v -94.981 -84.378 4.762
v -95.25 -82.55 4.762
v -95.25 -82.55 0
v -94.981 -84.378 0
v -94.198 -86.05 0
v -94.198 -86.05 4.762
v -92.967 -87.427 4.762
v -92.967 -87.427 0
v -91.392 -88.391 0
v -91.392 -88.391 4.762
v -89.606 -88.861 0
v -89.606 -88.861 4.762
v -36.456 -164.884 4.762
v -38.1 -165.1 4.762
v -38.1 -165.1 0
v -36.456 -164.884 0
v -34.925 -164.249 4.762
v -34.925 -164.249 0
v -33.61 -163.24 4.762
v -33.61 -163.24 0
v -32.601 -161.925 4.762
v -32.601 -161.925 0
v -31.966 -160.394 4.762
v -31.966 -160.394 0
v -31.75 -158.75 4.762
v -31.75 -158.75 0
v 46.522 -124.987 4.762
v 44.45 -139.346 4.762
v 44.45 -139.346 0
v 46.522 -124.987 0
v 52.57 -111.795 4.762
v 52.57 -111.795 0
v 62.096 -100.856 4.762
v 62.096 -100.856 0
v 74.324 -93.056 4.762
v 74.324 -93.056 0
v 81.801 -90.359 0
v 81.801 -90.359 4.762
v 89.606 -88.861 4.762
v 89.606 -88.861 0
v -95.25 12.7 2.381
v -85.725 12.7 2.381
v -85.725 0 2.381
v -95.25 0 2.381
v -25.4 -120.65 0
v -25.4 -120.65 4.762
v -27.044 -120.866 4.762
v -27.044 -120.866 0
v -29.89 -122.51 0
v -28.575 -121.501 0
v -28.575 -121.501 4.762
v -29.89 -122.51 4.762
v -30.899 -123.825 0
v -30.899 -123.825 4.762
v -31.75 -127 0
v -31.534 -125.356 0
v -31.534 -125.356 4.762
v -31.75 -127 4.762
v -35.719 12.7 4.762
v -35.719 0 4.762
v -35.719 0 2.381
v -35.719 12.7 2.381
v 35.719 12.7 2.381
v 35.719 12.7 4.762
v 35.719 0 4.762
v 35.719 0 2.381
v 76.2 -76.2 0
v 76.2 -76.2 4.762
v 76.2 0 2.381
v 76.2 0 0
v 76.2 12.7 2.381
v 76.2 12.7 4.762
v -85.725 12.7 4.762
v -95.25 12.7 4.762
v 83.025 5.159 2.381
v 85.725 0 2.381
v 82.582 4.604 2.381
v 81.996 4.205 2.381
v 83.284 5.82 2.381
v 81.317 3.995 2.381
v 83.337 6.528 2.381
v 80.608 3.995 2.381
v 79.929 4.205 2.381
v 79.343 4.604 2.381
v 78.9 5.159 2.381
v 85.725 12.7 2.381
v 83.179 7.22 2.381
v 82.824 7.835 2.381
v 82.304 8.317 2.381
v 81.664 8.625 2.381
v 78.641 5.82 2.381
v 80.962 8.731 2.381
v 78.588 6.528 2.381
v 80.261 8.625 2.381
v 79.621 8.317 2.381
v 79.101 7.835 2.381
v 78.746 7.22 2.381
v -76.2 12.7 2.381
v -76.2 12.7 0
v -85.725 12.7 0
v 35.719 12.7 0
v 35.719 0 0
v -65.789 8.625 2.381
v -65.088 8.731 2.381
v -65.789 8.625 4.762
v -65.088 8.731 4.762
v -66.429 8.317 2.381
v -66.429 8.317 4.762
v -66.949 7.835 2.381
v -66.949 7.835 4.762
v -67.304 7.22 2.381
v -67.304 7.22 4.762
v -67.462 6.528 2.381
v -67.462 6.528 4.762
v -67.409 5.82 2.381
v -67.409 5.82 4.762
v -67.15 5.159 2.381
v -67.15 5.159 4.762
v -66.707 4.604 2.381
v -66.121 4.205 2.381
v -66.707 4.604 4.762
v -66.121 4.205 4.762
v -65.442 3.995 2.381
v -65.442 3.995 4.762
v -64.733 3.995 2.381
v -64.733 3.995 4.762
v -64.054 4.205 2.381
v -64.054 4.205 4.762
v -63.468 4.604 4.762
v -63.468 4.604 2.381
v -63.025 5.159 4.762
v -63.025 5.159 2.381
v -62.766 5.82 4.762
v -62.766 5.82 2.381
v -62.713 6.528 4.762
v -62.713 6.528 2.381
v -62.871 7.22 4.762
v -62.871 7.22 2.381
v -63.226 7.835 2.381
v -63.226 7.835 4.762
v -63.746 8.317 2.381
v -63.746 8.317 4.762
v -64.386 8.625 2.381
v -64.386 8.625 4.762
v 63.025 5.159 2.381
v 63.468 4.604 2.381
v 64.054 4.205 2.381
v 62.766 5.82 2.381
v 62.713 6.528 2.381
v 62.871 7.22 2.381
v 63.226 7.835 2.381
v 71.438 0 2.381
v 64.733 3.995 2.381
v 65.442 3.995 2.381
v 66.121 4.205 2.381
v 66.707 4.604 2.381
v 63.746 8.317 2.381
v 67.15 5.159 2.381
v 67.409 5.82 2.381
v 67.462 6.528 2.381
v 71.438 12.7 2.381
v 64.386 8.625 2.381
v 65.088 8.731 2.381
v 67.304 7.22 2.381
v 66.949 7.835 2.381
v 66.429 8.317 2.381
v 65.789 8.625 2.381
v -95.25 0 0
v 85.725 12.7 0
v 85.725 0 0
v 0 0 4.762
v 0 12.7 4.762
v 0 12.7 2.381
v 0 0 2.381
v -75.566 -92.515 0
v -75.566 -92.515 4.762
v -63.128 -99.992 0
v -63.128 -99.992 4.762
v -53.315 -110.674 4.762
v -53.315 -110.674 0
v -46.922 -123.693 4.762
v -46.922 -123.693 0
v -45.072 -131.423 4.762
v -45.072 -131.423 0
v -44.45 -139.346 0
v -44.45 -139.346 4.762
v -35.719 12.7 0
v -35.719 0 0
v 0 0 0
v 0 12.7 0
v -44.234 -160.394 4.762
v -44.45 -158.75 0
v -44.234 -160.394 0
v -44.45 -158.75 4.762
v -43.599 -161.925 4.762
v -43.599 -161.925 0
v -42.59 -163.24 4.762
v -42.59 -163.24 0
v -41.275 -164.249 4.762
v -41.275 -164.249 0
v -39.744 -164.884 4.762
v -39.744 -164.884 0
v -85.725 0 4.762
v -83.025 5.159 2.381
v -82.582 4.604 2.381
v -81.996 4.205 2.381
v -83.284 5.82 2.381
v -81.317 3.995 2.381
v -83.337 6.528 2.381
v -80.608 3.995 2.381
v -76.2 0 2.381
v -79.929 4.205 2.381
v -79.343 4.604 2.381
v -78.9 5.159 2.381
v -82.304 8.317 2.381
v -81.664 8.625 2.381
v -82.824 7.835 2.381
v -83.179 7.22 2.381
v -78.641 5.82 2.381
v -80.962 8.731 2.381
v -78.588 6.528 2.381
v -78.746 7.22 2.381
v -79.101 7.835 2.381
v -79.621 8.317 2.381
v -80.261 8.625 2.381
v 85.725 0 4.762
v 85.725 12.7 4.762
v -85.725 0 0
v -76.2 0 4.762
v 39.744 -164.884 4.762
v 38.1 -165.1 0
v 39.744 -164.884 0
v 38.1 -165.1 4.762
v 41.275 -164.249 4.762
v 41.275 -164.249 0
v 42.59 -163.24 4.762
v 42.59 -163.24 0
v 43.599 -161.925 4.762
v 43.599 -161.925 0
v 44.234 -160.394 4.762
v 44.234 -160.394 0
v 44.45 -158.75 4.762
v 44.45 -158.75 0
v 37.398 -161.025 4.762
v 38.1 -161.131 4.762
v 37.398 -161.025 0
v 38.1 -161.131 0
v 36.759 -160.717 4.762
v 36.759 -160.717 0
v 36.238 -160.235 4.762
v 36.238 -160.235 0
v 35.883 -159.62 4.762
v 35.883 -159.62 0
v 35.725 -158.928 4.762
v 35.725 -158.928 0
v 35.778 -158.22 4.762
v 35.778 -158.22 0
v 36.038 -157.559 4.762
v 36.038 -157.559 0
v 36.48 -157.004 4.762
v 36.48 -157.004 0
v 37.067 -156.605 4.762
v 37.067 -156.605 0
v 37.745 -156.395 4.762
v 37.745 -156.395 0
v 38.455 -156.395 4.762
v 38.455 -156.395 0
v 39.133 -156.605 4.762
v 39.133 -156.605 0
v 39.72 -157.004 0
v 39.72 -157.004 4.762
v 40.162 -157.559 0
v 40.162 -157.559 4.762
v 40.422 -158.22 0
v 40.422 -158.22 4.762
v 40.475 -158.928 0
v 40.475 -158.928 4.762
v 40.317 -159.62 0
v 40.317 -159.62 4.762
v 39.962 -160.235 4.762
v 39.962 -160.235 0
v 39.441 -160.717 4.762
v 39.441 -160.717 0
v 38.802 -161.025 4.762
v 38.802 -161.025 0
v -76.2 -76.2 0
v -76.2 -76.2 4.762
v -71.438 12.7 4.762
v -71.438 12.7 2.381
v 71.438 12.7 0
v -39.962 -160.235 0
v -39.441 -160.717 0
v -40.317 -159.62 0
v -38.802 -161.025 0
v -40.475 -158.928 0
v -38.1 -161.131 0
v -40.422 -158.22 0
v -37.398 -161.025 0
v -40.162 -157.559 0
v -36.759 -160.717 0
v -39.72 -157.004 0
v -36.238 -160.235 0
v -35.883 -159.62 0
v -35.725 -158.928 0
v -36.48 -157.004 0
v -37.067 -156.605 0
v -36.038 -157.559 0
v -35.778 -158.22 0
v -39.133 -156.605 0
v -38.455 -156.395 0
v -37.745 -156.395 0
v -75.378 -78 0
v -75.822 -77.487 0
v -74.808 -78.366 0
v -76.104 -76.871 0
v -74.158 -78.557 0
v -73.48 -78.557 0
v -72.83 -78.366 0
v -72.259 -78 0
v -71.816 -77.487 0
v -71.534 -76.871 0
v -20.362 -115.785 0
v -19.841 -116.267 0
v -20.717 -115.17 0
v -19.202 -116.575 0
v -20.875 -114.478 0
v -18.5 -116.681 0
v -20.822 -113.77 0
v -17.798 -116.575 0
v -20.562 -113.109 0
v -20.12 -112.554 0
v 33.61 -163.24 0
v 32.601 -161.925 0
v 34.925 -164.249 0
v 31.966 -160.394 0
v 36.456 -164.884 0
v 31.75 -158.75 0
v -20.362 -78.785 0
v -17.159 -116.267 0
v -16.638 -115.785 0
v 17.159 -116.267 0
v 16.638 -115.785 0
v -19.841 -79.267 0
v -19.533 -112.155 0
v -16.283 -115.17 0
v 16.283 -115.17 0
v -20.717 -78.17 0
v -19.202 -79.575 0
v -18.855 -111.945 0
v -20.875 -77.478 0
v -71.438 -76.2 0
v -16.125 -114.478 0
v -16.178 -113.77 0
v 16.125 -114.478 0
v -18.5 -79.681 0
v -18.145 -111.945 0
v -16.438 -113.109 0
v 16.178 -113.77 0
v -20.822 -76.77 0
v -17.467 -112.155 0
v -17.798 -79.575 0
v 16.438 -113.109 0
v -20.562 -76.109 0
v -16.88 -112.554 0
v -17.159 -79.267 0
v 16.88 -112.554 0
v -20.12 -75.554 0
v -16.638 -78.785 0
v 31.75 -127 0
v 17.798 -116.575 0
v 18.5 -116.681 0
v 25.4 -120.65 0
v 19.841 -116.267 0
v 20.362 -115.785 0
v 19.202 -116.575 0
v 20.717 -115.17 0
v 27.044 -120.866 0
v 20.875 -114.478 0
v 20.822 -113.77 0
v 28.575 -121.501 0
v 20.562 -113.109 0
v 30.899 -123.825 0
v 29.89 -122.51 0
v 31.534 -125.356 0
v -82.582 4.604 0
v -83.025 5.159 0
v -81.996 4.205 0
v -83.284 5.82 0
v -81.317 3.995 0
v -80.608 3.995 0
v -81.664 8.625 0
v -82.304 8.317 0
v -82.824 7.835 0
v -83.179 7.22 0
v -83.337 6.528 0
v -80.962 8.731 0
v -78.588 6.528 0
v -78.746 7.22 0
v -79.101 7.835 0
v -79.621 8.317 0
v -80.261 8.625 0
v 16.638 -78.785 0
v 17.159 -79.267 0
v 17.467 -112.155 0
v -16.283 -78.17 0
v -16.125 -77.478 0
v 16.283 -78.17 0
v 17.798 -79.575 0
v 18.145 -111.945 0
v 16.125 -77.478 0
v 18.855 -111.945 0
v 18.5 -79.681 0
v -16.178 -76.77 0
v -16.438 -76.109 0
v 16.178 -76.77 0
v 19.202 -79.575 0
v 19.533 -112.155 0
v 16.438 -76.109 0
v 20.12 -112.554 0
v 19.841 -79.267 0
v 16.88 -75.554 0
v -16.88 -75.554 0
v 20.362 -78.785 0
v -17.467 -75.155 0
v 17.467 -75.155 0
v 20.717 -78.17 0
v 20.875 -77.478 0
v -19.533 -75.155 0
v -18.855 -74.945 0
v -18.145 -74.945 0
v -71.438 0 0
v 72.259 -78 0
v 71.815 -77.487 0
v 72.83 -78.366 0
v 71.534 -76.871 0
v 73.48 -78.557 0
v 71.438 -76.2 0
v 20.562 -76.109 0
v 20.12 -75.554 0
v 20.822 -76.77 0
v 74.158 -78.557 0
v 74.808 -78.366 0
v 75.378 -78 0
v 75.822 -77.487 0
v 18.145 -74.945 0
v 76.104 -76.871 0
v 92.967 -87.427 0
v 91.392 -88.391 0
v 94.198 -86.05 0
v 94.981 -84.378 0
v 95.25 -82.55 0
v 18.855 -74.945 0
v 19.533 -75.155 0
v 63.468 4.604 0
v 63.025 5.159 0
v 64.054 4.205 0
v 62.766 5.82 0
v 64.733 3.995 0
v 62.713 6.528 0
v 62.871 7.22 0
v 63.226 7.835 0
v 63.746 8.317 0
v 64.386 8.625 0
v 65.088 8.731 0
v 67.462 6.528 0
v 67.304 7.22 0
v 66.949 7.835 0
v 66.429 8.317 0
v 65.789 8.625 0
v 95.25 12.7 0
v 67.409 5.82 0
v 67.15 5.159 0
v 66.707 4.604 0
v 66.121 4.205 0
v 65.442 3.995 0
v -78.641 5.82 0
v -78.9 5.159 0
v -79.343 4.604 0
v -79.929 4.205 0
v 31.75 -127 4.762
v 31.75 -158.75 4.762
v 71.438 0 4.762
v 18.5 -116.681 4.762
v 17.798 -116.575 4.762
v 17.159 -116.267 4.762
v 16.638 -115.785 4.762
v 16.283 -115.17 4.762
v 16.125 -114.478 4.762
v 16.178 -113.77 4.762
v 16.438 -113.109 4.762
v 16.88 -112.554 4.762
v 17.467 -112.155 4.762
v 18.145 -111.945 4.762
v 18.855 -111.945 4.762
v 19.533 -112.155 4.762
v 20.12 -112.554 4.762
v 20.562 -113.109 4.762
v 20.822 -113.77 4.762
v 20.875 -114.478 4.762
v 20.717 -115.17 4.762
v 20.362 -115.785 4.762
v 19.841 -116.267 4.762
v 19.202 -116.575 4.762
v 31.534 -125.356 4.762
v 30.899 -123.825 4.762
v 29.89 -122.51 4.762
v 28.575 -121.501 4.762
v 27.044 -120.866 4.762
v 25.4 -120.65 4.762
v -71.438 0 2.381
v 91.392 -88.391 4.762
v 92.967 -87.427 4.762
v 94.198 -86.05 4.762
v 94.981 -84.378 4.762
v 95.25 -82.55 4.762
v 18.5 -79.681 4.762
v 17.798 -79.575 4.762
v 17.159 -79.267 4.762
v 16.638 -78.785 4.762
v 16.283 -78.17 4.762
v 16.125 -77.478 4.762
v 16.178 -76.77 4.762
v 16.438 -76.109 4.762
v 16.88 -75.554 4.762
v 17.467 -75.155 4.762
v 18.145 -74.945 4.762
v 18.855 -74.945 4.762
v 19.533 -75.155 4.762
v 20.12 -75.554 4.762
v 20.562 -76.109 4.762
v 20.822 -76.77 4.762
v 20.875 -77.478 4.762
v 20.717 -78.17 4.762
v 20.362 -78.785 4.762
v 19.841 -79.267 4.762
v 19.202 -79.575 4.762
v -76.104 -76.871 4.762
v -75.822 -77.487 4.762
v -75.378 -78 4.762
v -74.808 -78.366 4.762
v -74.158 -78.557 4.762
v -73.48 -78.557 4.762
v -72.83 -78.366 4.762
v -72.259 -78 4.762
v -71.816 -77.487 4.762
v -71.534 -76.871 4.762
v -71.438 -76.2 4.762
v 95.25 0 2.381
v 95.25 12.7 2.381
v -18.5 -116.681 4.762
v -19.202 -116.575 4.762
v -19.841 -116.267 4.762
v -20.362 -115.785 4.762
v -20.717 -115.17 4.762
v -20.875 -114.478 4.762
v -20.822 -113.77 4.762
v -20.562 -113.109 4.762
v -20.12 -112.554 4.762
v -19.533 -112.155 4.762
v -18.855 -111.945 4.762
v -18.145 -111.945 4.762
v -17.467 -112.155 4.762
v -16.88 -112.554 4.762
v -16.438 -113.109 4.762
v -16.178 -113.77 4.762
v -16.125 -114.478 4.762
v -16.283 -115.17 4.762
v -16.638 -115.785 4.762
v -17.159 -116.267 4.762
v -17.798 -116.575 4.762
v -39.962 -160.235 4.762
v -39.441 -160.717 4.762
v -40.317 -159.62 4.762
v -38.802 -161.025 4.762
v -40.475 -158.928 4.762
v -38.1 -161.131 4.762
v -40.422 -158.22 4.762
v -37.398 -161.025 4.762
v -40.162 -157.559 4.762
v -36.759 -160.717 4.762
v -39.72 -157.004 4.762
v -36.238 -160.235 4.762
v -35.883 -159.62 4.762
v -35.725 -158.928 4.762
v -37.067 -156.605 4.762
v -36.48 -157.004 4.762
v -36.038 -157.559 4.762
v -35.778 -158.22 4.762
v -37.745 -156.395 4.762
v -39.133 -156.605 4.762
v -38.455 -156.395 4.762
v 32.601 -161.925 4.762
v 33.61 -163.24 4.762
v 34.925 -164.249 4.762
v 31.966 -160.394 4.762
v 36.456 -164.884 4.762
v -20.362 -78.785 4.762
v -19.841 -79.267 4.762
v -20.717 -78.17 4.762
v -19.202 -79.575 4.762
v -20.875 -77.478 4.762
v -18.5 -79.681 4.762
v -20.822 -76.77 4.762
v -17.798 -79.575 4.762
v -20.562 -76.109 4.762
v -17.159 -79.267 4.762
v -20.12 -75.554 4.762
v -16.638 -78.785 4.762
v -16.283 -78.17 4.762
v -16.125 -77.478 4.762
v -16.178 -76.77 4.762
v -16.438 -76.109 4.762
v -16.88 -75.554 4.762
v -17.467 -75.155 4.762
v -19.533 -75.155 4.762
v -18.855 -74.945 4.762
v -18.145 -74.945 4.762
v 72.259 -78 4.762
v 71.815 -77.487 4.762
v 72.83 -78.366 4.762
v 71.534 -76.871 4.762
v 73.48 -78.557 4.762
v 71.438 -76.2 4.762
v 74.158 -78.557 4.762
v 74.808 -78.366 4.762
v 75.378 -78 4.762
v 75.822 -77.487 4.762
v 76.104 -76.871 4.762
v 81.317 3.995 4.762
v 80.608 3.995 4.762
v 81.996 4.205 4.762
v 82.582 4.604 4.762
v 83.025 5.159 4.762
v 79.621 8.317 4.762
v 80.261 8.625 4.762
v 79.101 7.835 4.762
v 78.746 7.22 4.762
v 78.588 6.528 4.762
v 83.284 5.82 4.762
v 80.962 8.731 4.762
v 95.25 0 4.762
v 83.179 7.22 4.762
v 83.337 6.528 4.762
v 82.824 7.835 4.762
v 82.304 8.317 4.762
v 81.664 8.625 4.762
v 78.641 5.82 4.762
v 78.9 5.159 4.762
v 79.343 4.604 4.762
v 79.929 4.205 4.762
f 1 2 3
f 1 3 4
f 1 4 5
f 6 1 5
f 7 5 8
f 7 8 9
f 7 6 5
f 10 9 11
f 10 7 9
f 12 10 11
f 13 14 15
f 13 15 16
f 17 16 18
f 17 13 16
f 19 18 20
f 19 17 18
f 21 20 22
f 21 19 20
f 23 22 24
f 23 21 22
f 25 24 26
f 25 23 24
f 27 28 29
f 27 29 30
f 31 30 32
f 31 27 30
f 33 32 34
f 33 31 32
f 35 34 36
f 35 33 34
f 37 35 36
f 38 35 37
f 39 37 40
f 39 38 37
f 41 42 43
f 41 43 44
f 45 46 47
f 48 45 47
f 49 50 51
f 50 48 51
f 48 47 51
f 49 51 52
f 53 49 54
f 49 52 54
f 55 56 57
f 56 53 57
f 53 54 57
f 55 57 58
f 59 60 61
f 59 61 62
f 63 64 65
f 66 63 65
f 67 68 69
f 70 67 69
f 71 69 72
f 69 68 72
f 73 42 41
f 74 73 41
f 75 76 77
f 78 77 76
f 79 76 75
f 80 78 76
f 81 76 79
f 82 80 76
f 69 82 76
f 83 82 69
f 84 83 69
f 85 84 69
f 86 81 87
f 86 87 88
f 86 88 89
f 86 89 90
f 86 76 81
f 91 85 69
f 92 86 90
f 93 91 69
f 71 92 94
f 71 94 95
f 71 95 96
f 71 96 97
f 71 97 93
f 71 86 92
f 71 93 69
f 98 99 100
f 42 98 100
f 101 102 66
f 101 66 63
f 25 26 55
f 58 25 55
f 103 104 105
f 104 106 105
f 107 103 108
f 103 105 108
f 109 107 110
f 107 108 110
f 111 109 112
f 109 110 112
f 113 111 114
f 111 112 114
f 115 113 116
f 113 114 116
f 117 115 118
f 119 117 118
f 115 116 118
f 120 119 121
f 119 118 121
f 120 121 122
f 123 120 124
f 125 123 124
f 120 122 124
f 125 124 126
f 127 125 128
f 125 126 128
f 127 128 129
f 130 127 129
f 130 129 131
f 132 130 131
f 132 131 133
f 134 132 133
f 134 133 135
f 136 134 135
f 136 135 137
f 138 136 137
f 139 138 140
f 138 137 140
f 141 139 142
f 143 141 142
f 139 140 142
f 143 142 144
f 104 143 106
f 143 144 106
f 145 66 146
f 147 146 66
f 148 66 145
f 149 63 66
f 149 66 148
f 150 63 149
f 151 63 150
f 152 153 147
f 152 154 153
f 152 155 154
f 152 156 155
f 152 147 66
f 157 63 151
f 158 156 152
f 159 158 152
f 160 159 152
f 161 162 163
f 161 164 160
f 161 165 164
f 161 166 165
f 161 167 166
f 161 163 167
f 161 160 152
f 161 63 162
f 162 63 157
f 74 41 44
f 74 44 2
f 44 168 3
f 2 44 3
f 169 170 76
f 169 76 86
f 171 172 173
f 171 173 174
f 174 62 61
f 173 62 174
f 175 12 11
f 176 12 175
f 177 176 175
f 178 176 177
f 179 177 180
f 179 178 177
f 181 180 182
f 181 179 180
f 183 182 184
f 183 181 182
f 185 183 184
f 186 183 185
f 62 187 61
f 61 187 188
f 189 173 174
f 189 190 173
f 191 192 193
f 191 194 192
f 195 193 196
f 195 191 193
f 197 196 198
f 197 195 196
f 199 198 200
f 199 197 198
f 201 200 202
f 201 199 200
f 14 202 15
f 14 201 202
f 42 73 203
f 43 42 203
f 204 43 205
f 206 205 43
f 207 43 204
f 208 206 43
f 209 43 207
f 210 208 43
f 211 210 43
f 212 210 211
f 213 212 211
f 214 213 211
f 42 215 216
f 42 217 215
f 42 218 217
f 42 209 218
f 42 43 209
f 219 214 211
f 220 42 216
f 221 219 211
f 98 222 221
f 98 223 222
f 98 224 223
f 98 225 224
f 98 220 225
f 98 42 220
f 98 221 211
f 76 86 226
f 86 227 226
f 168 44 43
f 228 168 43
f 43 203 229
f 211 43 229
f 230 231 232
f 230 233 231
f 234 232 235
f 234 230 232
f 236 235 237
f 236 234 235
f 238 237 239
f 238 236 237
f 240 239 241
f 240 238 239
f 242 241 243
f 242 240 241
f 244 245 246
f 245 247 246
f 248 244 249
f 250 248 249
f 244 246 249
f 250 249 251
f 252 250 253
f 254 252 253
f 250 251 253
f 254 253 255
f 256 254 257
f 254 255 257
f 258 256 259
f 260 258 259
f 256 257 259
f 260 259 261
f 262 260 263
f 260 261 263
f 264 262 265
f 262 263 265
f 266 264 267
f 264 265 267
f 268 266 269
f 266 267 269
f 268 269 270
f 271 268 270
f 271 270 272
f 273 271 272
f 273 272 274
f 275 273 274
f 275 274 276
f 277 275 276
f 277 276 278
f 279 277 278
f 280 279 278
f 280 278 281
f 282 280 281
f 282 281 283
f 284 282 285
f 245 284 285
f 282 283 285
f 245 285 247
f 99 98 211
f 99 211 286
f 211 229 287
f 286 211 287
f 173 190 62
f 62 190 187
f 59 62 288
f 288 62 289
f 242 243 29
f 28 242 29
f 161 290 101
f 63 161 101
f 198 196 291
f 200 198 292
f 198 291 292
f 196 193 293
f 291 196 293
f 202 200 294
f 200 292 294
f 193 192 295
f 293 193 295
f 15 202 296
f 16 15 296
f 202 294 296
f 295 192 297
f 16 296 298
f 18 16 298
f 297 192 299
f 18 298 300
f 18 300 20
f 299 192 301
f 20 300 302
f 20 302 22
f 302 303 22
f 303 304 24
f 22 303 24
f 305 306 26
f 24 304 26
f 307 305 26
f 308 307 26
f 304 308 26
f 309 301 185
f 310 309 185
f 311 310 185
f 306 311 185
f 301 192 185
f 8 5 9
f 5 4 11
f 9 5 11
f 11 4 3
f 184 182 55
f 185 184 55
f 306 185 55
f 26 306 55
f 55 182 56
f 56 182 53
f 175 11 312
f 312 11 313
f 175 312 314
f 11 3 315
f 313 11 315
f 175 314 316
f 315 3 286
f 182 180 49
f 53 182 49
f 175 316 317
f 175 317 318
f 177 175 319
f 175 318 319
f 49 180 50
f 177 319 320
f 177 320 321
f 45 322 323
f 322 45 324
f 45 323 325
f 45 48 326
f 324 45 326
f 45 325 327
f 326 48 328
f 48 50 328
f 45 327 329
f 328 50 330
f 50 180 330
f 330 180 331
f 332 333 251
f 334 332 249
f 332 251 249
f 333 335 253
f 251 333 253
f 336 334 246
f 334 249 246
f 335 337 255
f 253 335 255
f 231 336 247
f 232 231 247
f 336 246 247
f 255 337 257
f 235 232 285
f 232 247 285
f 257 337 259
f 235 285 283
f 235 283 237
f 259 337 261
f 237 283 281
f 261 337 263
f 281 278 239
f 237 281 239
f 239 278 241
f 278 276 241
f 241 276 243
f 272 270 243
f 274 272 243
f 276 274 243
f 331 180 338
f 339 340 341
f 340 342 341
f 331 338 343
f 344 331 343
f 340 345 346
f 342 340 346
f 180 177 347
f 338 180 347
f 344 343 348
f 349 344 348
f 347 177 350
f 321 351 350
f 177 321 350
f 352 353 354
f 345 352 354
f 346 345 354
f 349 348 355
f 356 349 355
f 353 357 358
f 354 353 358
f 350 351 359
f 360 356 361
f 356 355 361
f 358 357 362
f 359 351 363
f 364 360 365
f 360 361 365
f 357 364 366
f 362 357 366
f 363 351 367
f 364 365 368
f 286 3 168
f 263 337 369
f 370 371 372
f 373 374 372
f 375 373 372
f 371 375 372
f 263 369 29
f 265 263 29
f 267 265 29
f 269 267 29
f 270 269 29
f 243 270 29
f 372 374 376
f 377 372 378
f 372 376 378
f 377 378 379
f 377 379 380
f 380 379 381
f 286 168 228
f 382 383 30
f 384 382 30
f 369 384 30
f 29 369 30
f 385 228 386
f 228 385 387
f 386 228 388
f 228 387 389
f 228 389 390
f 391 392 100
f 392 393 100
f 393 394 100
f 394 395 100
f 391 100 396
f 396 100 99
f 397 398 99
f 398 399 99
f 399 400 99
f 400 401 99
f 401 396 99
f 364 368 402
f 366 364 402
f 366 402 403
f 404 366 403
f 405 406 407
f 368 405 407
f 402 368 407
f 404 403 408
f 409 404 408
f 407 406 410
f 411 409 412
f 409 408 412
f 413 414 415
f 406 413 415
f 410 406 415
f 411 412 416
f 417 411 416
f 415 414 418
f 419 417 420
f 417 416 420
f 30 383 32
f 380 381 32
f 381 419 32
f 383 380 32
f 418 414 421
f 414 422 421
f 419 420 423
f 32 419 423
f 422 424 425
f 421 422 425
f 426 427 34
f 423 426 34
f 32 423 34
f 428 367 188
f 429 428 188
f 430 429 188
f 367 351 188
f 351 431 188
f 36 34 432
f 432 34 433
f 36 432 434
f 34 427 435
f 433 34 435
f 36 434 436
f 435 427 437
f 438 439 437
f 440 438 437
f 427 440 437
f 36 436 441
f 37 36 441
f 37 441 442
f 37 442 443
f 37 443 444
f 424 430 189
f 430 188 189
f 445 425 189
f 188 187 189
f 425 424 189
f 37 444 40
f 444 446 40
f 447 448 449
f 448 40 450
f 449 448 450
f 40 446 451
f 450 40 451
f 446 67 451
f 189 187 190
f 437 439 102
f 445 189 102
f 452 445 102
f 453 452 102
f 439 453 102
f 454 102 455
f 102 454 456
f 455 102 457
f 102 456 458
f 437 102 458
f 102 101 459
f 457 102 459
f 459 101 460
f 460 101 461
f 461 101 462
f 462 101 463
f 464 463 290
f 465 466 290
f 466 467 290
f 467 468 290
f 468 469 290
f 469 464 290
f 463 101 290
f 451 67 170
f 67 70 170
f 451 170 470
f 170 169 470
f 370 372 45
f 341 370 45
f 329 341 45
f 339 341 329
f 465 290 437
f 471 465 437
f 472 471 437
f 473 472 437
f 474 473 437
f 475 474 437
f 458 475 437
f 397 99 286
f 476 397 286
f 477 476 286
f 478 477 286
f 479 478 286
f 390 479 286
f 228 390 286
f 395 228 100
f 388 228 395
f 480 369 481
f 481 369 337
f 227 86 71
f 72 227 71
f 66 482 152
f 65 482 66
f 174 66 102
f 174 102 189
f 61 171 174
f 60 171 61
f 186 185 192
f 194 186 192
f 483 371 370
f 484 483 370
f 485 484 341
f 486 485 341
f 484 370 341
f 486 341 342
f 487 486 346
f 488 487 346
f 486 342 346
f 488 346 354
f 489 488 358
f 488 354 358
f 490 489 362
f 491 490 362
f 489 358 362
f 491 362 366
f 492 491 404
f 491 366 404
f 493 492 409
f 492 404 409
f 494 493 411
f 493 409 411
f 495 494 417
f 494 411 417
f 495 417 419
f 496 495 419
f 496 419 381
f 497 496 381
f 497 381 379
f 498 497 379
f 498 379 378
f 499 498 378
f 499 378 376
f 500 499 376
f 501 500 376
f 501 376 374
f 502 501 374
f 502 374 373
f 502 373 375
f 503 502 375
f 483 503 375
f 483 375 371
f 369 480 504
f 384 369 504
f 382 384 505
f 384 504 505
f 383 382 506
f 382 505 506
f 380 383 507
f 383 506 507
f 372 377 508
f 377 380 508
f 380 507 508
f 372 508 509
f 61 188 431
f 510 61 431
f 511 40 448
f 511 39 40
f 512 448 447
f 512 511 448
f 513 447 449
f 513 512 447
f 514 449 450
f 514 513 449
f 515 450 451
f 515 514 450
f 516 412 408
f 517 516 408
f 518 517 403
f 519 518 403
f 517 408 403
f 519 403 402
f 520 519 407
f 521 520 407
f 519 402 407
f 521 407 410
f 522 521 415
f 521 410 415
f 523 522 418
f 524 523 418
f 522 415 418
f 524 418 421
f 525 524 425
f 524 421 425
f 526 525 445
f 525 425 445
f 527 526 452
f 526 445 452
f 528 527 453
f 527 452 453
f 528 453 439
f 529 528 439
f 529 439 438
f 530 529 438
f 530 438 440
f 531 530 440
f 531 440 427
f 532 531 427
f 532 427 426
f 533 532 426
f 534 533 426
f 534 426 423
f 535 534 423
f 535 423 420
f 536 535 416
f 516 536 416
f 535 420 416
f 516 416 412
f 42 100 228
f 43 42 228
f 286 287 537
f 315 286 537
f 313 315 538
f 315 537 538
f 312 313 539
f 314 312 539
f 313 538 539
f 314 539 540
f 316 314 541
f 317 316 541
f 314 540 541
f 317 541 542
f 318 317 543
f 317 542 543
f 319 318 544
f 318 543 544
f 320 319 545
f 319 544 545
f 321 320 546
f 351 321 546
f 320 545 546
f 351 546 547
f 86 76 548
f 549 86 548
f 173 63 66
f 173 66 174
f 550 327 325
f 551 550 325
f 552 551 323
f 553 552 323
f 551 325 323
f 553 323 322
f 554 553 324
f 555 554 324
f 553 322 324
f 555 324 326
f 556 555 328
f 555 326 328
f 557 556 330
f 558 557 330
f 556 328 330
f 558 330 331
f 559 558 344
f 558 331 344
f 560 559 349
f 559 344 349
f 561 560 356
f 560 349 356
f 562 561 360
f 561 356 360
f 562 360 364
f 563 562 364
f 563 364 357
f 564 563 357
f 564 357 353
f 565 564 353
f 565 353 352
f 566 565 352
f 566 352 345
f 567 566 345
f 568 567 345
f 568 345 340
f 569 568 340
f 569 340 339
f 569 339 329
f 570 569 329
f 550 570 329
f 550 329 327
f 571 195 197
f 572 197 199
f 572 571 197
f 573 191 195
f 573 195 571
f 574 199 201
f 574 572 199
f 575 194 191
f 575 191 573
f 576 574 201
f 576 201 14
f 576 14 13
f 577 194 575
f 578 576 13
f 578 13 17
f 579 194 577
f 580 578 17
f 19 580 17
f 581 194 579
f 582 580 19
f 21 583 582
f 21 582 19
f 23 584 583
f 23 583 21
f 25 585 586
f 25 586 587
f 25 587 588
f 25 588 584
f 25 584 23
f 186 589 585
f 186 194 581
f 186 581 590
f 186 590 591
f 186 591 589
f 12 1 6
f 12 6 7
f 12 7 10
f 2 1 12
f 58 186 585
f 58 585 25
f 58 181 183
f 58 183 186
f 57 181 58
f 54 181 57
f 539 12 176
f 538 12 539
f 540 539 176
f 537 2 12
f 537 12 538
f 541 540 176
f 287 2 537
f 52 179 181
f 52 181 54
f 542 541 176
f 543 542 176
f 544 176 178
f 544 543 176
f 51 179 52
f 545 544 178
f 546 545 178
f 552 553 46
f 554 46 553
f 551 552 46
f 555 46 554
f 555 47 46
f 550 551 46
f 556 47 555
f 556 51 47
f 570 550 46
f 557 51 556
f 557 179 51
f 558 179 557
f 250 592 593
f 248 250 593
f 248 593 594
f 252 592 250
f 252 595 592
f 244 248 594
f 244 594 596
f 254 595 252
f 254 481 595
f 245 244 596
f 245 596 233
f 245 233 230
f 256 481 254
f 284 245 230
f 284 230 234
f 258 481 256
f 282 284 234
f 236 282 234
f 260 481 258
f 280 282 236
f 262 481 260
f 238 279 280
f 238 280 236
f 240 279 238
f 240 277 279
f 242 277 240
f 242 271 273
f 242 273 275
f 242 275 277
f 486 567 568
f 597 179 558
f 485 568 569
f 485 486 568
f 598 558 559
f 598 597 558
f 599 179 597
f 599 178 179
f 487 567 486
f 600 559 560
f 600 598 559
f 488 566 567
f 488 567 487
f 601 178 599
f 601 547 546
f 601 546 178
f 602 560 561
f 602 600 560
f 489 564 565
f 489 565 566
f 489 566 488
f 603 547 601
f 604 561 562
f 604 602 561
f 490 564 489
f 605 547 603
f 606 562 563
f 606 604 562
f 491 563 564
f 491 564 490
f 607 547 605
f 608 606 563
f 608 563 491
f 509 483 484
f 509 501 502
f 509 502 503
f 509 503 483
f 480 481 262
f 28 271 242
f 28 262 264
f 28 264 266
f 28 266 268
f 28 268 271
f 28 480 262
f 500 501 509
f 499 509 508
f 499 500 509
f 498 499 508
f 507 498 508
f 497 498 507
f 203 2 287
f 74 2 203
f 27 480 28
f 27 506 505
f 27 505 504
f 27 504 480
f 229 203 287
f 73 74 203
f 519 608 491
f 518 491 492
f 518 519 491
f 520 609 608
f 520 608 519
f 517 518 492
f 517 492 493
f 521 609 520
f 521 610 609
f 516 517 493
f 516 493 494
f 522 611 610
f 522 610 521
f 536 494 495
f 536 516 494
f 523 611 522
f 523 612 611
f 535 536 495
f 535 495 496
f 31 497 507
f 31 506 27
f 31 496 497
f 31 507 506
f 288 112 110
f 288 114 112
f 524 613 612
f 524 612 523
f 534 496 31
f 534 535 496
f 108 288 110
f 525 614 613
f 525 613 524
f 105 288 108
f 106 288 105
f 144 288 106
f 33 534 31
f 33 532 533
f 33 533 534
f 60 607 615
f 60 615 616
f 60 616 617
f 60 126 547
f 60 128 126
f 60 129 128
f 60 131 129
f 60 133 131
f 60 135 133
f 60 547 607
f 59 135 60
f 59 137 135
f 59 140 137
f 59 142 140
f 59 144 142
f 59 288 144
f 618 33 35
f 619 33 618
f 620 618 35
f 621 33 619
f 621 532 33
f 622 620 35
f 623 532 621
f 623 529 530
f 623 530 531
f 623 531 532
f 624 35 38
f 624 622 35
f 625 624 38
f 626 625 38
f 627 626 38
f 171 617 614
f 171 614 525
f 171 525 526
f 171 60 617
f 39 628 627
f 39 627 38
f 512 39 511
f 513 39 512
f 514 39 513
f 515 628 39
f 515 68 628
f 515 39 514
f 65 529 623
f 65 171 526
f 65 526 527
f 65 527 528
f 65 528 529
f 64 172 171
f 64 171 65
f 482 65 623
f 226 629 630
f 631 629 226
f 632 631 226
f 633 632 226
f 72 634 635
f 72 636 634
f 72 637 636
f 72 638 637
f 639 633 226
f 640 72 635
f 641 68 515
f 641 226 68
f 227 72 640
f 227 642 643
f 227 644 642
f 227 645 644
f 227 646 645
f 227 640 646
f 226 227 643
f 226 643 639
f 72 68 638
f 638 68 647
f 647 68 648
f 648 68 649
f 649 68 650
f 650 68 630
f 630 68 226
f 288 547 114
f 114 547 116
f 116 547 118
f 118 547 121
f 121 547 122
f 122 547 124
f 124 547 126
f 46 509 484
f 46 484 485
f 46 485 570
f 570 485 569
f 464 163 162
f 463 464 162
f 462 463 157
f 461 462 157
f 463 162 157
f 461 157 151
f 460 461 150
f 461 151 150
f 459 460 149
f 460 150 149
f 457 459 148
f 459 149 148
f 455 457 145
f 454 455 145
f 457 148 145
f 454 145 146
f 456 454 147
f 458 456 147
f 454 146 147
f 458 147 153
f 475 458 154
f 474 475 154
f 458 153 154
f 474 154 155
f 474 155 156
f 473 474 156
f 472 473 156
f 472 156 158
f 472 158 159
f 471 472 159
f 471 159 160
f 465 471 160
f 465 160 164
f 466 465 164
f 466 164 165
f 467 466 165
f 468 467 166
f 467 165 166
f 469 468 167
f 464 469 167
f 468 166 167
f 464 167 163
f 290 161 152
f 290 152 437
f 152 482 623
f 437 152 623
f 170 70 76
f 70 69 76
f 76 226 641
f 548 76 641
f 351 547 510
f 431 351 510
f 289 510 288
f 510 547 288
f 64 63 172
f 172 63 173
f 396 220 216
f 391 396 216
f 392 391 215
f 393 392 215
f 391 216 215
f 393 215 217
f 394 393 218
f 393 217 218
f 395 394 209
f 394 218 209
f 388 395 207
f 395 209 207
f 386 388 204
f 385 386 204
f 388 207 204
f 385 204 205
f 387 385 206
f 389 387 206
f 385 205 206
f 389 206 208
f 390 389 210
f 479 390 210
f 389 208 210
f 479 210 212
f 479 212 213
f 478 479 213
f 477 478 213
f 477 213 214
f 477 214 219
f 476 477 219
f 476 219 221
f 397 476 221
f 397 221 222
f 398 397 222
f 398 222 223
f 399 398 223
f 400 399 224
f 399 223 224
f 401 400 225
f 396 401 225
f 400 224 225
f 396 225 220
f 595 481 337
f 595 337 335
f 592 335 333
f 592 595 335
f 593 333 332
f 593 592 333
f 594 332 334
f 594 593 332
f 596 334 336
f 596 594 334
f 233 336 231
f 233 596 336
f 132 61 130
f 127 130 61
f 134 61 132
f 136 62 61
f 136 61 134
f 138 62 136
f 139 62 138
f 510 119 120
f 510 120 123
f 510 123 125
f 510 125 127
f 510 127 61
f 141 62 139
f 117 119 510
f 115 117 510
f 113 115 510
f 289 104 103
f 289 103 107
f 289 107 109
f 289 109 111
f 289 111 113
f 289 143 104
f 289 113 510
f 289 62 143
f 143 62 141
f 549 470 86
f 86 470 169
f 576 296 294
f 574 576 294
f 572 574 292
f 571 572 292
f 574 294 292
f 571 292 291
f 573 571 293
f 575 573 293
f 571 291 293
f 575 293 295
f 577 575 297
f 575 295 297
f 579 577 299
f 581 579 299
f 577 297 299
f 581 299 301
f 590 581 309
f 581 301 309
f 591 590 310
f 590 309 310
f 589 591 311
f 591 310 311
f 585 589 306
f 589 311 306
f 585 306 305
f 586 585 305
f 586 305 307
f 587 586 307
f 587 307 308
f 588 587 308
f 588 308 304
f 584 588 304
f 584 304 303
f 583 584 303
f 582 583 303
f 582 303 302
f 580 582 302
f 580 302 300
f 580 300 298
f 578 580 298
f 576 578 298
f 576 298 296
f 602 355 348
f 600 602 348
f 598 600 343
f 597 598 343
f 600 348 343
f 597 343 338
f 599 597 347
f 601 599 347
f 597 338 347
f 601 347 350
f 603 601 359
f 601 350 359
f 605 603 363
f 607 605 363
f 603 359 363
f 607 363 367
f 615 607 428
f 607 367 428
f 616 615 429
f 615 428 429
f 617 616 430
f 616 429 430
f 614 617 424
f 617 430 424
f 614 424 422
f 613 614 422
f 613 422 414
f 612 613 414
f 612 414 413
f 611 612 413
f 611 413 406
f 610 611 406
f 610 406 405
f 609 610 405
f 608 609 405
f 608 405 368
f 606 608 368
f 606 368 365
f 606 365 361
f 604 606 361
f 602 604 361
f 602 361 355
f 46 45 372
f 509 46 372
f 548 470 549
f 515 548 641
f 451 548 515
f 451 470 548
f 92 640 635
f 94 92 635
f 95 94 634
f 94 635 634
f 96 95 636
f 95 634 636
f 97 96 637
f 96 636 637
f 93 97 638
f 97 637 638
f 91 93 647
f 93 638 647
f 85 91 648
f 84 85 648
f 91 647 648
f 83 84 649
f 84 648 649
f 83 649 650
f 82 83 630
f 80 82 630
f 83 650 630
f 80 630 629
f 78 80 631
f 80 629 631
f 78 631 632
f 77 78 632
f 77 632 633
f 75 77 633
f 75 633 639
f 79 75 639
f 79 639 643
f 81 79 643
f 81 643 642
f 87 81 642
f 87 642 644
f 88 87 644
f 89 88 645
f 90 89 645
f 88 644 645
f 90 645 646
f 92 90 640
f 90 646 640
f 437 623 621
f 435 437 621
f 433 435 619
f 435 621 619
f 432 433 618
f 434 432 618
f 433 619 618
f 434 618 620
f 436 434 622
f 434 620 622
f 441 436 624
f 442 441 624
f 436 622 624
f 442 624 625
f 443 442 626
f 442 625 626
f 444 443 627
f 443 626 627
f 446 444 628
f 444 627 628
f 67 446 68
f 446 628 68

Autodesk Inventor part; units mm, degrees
ref_plane "YZ Plane" through (0, 0, 0) normal (1, 0, 0) x (0, 1, 0)
ref_plane "XZ Plane" through (0, 0, 0) normal (0, 1, 0) x (-1, 0, 0)
ref_plane "XY Plane" through (0, 0, 0) normal (0, 0, 1) x (1, 0, 0)
sketch "Sketch1" plane through (0, 0, 0) normal (0, 0, 1) x (1, 0, 0)
  line L0 (-133.35, 0) -> (133.35, 0) projected
  line L1 (0, -231.14) -> (0, 231.14) projected
  line L2 (-44.45, -165.1) -> (44.45, 165.1) construction
  line L3 (44.45, -165.1) -> (-44.45, 165.1) construction
  line L4 (-95.25, -88.9) -> (-44.45, -88.9)
  line L5 (-44.45, 88.9) -> (-95.25, 88.9)
  line L6 (-95.25, 88.9) -> (-95.25, -88.9)
  line L7 (-95.25, -88.9) -> (-44.45, 88.9) construction
  line L8 (-44.45, -88.9) -> (-95.25, 88.9) construction
  line L9 (95.25, -88.9) -> (44.45, -88.9)
  line L10 (44.45, 88.9) -> (95.25, 88.9)
  line L11 (95.25, 88.9) -> (95.25, -88.9)
  line L12 (95.25, -88.9) -> (44.45, 88.9) construction
  line L13 (44.45, -88.9) -> (95.25, 88.9) construction
  line L14 (44.45, -165.1) -> (44.45, -88.9)
  line L15 (44.45, 88.9) -> (44.45, 165.1)
  line L16 (-44.45, 165.1) -> (-44.45, 88.9)
  line L17 (-44.45, -88.9) -> (-44.45, -165.1)
  line L18 (-31.75, 120.65) -> (31.75, 120.65)
  line L19 (31.75, 120.65) -> (31.75, 165.1)
  line L20 (-31.75, 165.1) -> (-31.75, 120.65)
  line L21 (-31.75, 120.65) -> (31.75, 165.1) construction
  line L22 (31.75, 120.65) -> (-31.75, 165.1) construction
  line L23 (-31.75, -120.65) -> (31.75, -120.65)
  line L24 (31.75, -120.65) -> (31.75, -165.1)
  line L25 (-31.75, -165.1) -> (-31.75, -120.65)
  line L26 (-31.75, -120.65) -> (31.75, -165.1) construction
  line L27 (31.75, -120.65) -> (-31.75, -165.1) construction
  line L28 (44.45, 165.1) -> (31.75, 165.1)
  line L29 (-31.75, 165.1) -> (-44.45, 165.1)
  line L30 (-44.45, -165.1) -> (-31.75, -165.1)
  line L31 (31.75, -165.1) -> (44.45, -165.1)
  point P0 (0, 0)
  point P1 (-69.85, 0)
  point P2 (69.85, 0)
  point P3 (0, 142.875)
  point P4 (0, -142.875)
  dimension "d0" = 88.9
  dimension "d1" = 330.2
  dimension "d3" = 50.8
  dimension "d4" = 12.7
  dimension "d5" = 44.45
  dimension "d27" = 76.2
extrude "Extrusion1" add sketch "Sketch1" along normal blind 4.7625
sketch "Sketch2" plane through (0, 0, 4.7625) normal (0, 0, 1) x (1, 0, 0)
  line L0 (0, -231.14) -> (0, 231.14) projected
  line L1 (-133.35, 0) -> (133.35, 0) projected
  line L2 (31.75, -165.1) -> (44.45, -165.1) projected
  line L3 (44.45, -165.1) -> (44.45, -88.9) projected
  line L4 (-31.75, -120.65) -> (31.75, -120.65) projected
  point P0 (0, 0)
  point P1 (38.1, -158.75)
  point P2 (-38.1, -158.75)
  point P3 (38.1, 158.75)
  point P4 (-38.1, 158.75)
  point P5 (18.5, -114.3)
  point P6 (-18.5, -114.3)
  point P7 (-18.5, -77.3)
  point P8 (18.5, -77.3)
  point P9 (18.5, 77.3)
  point P10 (-18.5, 77.3)
  point P11 (18.5, 114.3)
  point P12 (-18.5, 114.3)
  dimension "d10" = 6.35
  dimension "d11" = 6.35
  dimension "d12" = 37
  dimension "d13" = 37
  dimension "d14" = 6.35
hole "Hole1" at (38.1, -158.75, 4.7625) at (-38.1, -158.75, 4.7625) at (38.1, 158.75, 4.7625) at (-38.1, 158.75, 4.7625) at (18.5, -114.3, 4.7625) at (-18.5, -114.3, 4.7625) at (-18.5, -77.3, 4.7625) at (18.5, -77.3, 4.7625) at (18.5, 77.3, 4.7625) at (-18.5, 77.3, 4.7625) at (18.5, 114.3, 4.7625) at (-18.5, 114.3, 4.7625) direction (0, 0, -1) diameter 4.7625 end through all
sketch "Sketch3" plane through (0, 0, 4.7625) normal (0, 0, 1) x (1, 0, 0)
  line L0 (73.8188, -76.2) -> (73.8187, 76.2) construction
  line L1 (76.2, -76.2) -> (76.2, 76.2)
  line L2 (71.4375, 76.2) -> (71.4375, -76.2)
  arc A0 (71.4375, -76.2) -> (76.2, -76.2) centre (73.8188, -76.2) ccw
  arc A1 (76.2, 76.2) -> (71.4375, 76.2) centre (73.8187, 76.2) ccw
  line L3 (-73.8188, -76.2) -> (-73.8188, 76.2) construction
  line L4 (-71.4375, -76.2) -> (-71.4375, 76.2)
  line L5 (-76.2, 76.2) -> (-76.2, -76.2)
  arc A2 (-76.2, -76.2) -> (-71.4375, -76.2) centre (-73.8188, -76.2) ccw
  arc A3 (-71.4375, 76.2) -> (-76.2, 76.2) centre (-73.8188, 76.2) ccw
  line L6 (0, -231.14) -> (0, 231.14) projected
  line L7 (-133.35, 0) -> (133.35, 0) projected
  line L8 (95.25, -88.9) -> (95.25, 88.9) projected
  point P0 (0, 0)
  point P1 (73.8187, 0)
  point P2 (-73.8187, 0)
  dimension "d22" = 152.4
  dimension "d23" = 4.7625
  dimension "d24" = 19.05
extrude "Extrusion2" cut sketch "Sketch3" along normal through all both and the other way through all
fillet "Fillet1" radius 6.35 16 edges at (44.45, 165.1, 2.3813) (31.75, 165.1, 2.3813) (95.25, 88.9, 2.3813) (31.75, 120.65, 2.3813) (-31.75, 120.65, 2.3813) (-31.75, 165.1, 2.3813) (-44.45, 165.1, 2.3813) (-95.25, 88.9, 2.3813) (-95.25, -88.9, 2.3813) (-44.45, -165.1, 2.3813) (-31.75, -165.1, 2.3813) (-31.75, -120.65, 2.3813) (31.75, -120.65, 2.3813) (31.75, -165.1, 2.3813) (44.45, -165.1, 2.3813) (95.25, -88.9, 2.3813)
fillet "Fillet2" radius 50.8 4 edges at (44.45, -88.9, 2.3813) (-44.45, -88.9, 2.3813) (-44.45, 88.9, 2.3813) (44.45, 88.9, 2.3813)
sketch "Sketch4" plane through (0, 0, 4.7625) normal (0, 0, 1) x (1, 0, 0)
  line L0 (-133.35, 0) -> (133.35, 0) projected
  line L1 (0, -231.14) -> (0, 231.14) projected
  line L2 (95.25, -82.55) -> (95.25, 82.55) projected
  line L3 (95.25, 12.7) -> (-95.25, 12.7)
  line L4 (-95.25, 12.7) -> (-95.25, 165.1)
  line L5 (-95.25, 165.1) -> (95.25, 165.1)
  line L6 (95.25, 165.1) -> (95.25, 12.7)
  arc A0 (-31.75, 158.75) -> (-44.45, 158.75) centre (-38.1, 158.75) ccw projected
  point P0 (0, 0)
  point P1 (-95.25, 82.55)
  dimension "d30" = 12.7
extrude "Extrusion3" cut sketch "Sketch4" along normal through all both and the other way through all contours L3 L4 L5 L1 | L1 L5 L6 L2 L3
sketch "Sketch5" plane through (0, 0, 4.7625) normal (0, 0, 1) x (1, 0, 0)
  line L0 (-95.25, 12.7) -> (-76.2, 12.7) projected
  line L1 (-76.2, 12.7) -> (-85.725, 12.7)
  line L2 (-85.725, 12.7) -> (-85.725, 0)
  line L3 (-85.725, 0) -> (-76.2, 0)
  line L4 (-76.2, 0) -> (-76.2, 12.7)
  line L5 (71.4375, 12.7) -> (-71.4375, 12.7) projected
  line L6 (0, 0) -> (-35.7188, 0)
  line L7 (-35.7188, 0) -> (-35.7187, 12.7)
  line L8 (-35.7187, 12.7) -> (0, 12.7)
  line L9 (0, 12.7) -> (0, 0)
  line L10 (71.4375, 12.7) -> (35.7188, 12.7)
  line L11 (35.7188, 12.7) -> (35.7188, 0)
  line L12 (35.7188, 0) -> (71.4375, 0)
  line L13 (71.4375, 0) -> (71.4375, 12.7)
  line L14 (95.25, -82.55) -> (95.25, 12.7) projected
  line L15 (95.25, 12.7) -> (85.725, 12.7)
  line L16 (85.725, 12.7) -> (85.725, 0)
  line L17 (85.725, 0) -> (95.25, 0)
  line L18 (95.25, 0) -> (95.25, 12.7)
  line L19 (95.25, 12.7) -> (76.2, 12.7) projected
  point P0 (-85.725, 12.7)
  dimension "d33" = 35.7188
  dimension "d34" = 35.7188
extrude "Extrusion4" cut sketch "Sketch5" against normal blind 2.3813
sketch "Sketch6" plane through (0, 0, 0) normal (0, 0, -1) x (-1, 0, 0)
  line L0 (95.25, 12.7) -> (95.25, -82.55) projected
  line L1 (85.725, 0) -> (95.25, 0)
  line L2 (95.25, 0) -> (95.25, 12.7)
  line L3 (95.25, 12.7) -> (85.725, 12.7)
  line L4 (85.725, 12.7) -> (85.725, 0)
  line L5 (71.4375, 12.7) -> (-71.4375, 12.7) projected
  line L6 (35.7188, 0) -> (71.4375, 0)
  line L7 (71.4375, 0) -> (71.4375, 12.7)
  line L8 (71.4375, 12.7) -> (35.7188, 12.7)
  line L9 (35.7188, 12.7) -> (35.7188, 0)
  line L10 (0, 0) -> (35.7188, 0) projected
  line L11 (0, 0) -> (-35.7188, 0)
  line L12 (-35.7188, 0) -> (-35.7188, 12.7)
  line L13 (-35.7188, 12.7) -> (0, 12.7)
  line L14 (0, 12.7) -> (0, 0)
  line L15 (-85.725, 0) -> (-85.725, 12.7) projected
  line L16 (-76.2, 12.7) -> (-76.2, -76.2) projected
  line L17 (-85.725, 0) -> (-76.2, 0)
  line L18 (-76.2, 0) -> (-76.2, 12.7)
  line L19 (-76.2, 12.7) -> (-85.725, 12.7)
  line L20 (-85.725, 12.7) -> (-85.725, 0)
extrude "Extrusion5" cut sketch "Sketch6" against normal blind 2.3813 contours L0 L1 L4 L3 | L7 L6 L9 L5 | L14 L11 L12 L5 | L15 L19 L16 L17
sketch "Sketch7" plane through (0, 0, 0) normal (0, 0, -1) x (-1, 0, 0)
  line L0 (71.4375, 12.7) -> (71.4375, 0) projected
  line L1 (0, -200.66) -> (0, 48.26) projected
  line L2 (-35.7188, 12.7) -> (-71.4375, 12.7) projected
  line L3 (-85.725, 0) -> (-85.725, 12.7) projected
  point P0 (0, 0)
  point P1 (80.9625, 6.35)
  point P2 (65.0875, 6.35)
  point P3 (-80.9625, 6.35)
  point P4 (-65.0875, 6.35)
  dimension "d39" = 6.35
  dimension "d40" = 6.35
  dimension "d41" = 4.7625
hole "Hole2" at (-80.9625, 6.35, 0) at (-65.0875, 6.35, 0) at (80.9625, 6.35, 0) at (65.0875, 6.35, 0) direction (0, 0, 1) diameter 4.7625 end through all
properties part number "RC_CAR_BASE_PLATE"
